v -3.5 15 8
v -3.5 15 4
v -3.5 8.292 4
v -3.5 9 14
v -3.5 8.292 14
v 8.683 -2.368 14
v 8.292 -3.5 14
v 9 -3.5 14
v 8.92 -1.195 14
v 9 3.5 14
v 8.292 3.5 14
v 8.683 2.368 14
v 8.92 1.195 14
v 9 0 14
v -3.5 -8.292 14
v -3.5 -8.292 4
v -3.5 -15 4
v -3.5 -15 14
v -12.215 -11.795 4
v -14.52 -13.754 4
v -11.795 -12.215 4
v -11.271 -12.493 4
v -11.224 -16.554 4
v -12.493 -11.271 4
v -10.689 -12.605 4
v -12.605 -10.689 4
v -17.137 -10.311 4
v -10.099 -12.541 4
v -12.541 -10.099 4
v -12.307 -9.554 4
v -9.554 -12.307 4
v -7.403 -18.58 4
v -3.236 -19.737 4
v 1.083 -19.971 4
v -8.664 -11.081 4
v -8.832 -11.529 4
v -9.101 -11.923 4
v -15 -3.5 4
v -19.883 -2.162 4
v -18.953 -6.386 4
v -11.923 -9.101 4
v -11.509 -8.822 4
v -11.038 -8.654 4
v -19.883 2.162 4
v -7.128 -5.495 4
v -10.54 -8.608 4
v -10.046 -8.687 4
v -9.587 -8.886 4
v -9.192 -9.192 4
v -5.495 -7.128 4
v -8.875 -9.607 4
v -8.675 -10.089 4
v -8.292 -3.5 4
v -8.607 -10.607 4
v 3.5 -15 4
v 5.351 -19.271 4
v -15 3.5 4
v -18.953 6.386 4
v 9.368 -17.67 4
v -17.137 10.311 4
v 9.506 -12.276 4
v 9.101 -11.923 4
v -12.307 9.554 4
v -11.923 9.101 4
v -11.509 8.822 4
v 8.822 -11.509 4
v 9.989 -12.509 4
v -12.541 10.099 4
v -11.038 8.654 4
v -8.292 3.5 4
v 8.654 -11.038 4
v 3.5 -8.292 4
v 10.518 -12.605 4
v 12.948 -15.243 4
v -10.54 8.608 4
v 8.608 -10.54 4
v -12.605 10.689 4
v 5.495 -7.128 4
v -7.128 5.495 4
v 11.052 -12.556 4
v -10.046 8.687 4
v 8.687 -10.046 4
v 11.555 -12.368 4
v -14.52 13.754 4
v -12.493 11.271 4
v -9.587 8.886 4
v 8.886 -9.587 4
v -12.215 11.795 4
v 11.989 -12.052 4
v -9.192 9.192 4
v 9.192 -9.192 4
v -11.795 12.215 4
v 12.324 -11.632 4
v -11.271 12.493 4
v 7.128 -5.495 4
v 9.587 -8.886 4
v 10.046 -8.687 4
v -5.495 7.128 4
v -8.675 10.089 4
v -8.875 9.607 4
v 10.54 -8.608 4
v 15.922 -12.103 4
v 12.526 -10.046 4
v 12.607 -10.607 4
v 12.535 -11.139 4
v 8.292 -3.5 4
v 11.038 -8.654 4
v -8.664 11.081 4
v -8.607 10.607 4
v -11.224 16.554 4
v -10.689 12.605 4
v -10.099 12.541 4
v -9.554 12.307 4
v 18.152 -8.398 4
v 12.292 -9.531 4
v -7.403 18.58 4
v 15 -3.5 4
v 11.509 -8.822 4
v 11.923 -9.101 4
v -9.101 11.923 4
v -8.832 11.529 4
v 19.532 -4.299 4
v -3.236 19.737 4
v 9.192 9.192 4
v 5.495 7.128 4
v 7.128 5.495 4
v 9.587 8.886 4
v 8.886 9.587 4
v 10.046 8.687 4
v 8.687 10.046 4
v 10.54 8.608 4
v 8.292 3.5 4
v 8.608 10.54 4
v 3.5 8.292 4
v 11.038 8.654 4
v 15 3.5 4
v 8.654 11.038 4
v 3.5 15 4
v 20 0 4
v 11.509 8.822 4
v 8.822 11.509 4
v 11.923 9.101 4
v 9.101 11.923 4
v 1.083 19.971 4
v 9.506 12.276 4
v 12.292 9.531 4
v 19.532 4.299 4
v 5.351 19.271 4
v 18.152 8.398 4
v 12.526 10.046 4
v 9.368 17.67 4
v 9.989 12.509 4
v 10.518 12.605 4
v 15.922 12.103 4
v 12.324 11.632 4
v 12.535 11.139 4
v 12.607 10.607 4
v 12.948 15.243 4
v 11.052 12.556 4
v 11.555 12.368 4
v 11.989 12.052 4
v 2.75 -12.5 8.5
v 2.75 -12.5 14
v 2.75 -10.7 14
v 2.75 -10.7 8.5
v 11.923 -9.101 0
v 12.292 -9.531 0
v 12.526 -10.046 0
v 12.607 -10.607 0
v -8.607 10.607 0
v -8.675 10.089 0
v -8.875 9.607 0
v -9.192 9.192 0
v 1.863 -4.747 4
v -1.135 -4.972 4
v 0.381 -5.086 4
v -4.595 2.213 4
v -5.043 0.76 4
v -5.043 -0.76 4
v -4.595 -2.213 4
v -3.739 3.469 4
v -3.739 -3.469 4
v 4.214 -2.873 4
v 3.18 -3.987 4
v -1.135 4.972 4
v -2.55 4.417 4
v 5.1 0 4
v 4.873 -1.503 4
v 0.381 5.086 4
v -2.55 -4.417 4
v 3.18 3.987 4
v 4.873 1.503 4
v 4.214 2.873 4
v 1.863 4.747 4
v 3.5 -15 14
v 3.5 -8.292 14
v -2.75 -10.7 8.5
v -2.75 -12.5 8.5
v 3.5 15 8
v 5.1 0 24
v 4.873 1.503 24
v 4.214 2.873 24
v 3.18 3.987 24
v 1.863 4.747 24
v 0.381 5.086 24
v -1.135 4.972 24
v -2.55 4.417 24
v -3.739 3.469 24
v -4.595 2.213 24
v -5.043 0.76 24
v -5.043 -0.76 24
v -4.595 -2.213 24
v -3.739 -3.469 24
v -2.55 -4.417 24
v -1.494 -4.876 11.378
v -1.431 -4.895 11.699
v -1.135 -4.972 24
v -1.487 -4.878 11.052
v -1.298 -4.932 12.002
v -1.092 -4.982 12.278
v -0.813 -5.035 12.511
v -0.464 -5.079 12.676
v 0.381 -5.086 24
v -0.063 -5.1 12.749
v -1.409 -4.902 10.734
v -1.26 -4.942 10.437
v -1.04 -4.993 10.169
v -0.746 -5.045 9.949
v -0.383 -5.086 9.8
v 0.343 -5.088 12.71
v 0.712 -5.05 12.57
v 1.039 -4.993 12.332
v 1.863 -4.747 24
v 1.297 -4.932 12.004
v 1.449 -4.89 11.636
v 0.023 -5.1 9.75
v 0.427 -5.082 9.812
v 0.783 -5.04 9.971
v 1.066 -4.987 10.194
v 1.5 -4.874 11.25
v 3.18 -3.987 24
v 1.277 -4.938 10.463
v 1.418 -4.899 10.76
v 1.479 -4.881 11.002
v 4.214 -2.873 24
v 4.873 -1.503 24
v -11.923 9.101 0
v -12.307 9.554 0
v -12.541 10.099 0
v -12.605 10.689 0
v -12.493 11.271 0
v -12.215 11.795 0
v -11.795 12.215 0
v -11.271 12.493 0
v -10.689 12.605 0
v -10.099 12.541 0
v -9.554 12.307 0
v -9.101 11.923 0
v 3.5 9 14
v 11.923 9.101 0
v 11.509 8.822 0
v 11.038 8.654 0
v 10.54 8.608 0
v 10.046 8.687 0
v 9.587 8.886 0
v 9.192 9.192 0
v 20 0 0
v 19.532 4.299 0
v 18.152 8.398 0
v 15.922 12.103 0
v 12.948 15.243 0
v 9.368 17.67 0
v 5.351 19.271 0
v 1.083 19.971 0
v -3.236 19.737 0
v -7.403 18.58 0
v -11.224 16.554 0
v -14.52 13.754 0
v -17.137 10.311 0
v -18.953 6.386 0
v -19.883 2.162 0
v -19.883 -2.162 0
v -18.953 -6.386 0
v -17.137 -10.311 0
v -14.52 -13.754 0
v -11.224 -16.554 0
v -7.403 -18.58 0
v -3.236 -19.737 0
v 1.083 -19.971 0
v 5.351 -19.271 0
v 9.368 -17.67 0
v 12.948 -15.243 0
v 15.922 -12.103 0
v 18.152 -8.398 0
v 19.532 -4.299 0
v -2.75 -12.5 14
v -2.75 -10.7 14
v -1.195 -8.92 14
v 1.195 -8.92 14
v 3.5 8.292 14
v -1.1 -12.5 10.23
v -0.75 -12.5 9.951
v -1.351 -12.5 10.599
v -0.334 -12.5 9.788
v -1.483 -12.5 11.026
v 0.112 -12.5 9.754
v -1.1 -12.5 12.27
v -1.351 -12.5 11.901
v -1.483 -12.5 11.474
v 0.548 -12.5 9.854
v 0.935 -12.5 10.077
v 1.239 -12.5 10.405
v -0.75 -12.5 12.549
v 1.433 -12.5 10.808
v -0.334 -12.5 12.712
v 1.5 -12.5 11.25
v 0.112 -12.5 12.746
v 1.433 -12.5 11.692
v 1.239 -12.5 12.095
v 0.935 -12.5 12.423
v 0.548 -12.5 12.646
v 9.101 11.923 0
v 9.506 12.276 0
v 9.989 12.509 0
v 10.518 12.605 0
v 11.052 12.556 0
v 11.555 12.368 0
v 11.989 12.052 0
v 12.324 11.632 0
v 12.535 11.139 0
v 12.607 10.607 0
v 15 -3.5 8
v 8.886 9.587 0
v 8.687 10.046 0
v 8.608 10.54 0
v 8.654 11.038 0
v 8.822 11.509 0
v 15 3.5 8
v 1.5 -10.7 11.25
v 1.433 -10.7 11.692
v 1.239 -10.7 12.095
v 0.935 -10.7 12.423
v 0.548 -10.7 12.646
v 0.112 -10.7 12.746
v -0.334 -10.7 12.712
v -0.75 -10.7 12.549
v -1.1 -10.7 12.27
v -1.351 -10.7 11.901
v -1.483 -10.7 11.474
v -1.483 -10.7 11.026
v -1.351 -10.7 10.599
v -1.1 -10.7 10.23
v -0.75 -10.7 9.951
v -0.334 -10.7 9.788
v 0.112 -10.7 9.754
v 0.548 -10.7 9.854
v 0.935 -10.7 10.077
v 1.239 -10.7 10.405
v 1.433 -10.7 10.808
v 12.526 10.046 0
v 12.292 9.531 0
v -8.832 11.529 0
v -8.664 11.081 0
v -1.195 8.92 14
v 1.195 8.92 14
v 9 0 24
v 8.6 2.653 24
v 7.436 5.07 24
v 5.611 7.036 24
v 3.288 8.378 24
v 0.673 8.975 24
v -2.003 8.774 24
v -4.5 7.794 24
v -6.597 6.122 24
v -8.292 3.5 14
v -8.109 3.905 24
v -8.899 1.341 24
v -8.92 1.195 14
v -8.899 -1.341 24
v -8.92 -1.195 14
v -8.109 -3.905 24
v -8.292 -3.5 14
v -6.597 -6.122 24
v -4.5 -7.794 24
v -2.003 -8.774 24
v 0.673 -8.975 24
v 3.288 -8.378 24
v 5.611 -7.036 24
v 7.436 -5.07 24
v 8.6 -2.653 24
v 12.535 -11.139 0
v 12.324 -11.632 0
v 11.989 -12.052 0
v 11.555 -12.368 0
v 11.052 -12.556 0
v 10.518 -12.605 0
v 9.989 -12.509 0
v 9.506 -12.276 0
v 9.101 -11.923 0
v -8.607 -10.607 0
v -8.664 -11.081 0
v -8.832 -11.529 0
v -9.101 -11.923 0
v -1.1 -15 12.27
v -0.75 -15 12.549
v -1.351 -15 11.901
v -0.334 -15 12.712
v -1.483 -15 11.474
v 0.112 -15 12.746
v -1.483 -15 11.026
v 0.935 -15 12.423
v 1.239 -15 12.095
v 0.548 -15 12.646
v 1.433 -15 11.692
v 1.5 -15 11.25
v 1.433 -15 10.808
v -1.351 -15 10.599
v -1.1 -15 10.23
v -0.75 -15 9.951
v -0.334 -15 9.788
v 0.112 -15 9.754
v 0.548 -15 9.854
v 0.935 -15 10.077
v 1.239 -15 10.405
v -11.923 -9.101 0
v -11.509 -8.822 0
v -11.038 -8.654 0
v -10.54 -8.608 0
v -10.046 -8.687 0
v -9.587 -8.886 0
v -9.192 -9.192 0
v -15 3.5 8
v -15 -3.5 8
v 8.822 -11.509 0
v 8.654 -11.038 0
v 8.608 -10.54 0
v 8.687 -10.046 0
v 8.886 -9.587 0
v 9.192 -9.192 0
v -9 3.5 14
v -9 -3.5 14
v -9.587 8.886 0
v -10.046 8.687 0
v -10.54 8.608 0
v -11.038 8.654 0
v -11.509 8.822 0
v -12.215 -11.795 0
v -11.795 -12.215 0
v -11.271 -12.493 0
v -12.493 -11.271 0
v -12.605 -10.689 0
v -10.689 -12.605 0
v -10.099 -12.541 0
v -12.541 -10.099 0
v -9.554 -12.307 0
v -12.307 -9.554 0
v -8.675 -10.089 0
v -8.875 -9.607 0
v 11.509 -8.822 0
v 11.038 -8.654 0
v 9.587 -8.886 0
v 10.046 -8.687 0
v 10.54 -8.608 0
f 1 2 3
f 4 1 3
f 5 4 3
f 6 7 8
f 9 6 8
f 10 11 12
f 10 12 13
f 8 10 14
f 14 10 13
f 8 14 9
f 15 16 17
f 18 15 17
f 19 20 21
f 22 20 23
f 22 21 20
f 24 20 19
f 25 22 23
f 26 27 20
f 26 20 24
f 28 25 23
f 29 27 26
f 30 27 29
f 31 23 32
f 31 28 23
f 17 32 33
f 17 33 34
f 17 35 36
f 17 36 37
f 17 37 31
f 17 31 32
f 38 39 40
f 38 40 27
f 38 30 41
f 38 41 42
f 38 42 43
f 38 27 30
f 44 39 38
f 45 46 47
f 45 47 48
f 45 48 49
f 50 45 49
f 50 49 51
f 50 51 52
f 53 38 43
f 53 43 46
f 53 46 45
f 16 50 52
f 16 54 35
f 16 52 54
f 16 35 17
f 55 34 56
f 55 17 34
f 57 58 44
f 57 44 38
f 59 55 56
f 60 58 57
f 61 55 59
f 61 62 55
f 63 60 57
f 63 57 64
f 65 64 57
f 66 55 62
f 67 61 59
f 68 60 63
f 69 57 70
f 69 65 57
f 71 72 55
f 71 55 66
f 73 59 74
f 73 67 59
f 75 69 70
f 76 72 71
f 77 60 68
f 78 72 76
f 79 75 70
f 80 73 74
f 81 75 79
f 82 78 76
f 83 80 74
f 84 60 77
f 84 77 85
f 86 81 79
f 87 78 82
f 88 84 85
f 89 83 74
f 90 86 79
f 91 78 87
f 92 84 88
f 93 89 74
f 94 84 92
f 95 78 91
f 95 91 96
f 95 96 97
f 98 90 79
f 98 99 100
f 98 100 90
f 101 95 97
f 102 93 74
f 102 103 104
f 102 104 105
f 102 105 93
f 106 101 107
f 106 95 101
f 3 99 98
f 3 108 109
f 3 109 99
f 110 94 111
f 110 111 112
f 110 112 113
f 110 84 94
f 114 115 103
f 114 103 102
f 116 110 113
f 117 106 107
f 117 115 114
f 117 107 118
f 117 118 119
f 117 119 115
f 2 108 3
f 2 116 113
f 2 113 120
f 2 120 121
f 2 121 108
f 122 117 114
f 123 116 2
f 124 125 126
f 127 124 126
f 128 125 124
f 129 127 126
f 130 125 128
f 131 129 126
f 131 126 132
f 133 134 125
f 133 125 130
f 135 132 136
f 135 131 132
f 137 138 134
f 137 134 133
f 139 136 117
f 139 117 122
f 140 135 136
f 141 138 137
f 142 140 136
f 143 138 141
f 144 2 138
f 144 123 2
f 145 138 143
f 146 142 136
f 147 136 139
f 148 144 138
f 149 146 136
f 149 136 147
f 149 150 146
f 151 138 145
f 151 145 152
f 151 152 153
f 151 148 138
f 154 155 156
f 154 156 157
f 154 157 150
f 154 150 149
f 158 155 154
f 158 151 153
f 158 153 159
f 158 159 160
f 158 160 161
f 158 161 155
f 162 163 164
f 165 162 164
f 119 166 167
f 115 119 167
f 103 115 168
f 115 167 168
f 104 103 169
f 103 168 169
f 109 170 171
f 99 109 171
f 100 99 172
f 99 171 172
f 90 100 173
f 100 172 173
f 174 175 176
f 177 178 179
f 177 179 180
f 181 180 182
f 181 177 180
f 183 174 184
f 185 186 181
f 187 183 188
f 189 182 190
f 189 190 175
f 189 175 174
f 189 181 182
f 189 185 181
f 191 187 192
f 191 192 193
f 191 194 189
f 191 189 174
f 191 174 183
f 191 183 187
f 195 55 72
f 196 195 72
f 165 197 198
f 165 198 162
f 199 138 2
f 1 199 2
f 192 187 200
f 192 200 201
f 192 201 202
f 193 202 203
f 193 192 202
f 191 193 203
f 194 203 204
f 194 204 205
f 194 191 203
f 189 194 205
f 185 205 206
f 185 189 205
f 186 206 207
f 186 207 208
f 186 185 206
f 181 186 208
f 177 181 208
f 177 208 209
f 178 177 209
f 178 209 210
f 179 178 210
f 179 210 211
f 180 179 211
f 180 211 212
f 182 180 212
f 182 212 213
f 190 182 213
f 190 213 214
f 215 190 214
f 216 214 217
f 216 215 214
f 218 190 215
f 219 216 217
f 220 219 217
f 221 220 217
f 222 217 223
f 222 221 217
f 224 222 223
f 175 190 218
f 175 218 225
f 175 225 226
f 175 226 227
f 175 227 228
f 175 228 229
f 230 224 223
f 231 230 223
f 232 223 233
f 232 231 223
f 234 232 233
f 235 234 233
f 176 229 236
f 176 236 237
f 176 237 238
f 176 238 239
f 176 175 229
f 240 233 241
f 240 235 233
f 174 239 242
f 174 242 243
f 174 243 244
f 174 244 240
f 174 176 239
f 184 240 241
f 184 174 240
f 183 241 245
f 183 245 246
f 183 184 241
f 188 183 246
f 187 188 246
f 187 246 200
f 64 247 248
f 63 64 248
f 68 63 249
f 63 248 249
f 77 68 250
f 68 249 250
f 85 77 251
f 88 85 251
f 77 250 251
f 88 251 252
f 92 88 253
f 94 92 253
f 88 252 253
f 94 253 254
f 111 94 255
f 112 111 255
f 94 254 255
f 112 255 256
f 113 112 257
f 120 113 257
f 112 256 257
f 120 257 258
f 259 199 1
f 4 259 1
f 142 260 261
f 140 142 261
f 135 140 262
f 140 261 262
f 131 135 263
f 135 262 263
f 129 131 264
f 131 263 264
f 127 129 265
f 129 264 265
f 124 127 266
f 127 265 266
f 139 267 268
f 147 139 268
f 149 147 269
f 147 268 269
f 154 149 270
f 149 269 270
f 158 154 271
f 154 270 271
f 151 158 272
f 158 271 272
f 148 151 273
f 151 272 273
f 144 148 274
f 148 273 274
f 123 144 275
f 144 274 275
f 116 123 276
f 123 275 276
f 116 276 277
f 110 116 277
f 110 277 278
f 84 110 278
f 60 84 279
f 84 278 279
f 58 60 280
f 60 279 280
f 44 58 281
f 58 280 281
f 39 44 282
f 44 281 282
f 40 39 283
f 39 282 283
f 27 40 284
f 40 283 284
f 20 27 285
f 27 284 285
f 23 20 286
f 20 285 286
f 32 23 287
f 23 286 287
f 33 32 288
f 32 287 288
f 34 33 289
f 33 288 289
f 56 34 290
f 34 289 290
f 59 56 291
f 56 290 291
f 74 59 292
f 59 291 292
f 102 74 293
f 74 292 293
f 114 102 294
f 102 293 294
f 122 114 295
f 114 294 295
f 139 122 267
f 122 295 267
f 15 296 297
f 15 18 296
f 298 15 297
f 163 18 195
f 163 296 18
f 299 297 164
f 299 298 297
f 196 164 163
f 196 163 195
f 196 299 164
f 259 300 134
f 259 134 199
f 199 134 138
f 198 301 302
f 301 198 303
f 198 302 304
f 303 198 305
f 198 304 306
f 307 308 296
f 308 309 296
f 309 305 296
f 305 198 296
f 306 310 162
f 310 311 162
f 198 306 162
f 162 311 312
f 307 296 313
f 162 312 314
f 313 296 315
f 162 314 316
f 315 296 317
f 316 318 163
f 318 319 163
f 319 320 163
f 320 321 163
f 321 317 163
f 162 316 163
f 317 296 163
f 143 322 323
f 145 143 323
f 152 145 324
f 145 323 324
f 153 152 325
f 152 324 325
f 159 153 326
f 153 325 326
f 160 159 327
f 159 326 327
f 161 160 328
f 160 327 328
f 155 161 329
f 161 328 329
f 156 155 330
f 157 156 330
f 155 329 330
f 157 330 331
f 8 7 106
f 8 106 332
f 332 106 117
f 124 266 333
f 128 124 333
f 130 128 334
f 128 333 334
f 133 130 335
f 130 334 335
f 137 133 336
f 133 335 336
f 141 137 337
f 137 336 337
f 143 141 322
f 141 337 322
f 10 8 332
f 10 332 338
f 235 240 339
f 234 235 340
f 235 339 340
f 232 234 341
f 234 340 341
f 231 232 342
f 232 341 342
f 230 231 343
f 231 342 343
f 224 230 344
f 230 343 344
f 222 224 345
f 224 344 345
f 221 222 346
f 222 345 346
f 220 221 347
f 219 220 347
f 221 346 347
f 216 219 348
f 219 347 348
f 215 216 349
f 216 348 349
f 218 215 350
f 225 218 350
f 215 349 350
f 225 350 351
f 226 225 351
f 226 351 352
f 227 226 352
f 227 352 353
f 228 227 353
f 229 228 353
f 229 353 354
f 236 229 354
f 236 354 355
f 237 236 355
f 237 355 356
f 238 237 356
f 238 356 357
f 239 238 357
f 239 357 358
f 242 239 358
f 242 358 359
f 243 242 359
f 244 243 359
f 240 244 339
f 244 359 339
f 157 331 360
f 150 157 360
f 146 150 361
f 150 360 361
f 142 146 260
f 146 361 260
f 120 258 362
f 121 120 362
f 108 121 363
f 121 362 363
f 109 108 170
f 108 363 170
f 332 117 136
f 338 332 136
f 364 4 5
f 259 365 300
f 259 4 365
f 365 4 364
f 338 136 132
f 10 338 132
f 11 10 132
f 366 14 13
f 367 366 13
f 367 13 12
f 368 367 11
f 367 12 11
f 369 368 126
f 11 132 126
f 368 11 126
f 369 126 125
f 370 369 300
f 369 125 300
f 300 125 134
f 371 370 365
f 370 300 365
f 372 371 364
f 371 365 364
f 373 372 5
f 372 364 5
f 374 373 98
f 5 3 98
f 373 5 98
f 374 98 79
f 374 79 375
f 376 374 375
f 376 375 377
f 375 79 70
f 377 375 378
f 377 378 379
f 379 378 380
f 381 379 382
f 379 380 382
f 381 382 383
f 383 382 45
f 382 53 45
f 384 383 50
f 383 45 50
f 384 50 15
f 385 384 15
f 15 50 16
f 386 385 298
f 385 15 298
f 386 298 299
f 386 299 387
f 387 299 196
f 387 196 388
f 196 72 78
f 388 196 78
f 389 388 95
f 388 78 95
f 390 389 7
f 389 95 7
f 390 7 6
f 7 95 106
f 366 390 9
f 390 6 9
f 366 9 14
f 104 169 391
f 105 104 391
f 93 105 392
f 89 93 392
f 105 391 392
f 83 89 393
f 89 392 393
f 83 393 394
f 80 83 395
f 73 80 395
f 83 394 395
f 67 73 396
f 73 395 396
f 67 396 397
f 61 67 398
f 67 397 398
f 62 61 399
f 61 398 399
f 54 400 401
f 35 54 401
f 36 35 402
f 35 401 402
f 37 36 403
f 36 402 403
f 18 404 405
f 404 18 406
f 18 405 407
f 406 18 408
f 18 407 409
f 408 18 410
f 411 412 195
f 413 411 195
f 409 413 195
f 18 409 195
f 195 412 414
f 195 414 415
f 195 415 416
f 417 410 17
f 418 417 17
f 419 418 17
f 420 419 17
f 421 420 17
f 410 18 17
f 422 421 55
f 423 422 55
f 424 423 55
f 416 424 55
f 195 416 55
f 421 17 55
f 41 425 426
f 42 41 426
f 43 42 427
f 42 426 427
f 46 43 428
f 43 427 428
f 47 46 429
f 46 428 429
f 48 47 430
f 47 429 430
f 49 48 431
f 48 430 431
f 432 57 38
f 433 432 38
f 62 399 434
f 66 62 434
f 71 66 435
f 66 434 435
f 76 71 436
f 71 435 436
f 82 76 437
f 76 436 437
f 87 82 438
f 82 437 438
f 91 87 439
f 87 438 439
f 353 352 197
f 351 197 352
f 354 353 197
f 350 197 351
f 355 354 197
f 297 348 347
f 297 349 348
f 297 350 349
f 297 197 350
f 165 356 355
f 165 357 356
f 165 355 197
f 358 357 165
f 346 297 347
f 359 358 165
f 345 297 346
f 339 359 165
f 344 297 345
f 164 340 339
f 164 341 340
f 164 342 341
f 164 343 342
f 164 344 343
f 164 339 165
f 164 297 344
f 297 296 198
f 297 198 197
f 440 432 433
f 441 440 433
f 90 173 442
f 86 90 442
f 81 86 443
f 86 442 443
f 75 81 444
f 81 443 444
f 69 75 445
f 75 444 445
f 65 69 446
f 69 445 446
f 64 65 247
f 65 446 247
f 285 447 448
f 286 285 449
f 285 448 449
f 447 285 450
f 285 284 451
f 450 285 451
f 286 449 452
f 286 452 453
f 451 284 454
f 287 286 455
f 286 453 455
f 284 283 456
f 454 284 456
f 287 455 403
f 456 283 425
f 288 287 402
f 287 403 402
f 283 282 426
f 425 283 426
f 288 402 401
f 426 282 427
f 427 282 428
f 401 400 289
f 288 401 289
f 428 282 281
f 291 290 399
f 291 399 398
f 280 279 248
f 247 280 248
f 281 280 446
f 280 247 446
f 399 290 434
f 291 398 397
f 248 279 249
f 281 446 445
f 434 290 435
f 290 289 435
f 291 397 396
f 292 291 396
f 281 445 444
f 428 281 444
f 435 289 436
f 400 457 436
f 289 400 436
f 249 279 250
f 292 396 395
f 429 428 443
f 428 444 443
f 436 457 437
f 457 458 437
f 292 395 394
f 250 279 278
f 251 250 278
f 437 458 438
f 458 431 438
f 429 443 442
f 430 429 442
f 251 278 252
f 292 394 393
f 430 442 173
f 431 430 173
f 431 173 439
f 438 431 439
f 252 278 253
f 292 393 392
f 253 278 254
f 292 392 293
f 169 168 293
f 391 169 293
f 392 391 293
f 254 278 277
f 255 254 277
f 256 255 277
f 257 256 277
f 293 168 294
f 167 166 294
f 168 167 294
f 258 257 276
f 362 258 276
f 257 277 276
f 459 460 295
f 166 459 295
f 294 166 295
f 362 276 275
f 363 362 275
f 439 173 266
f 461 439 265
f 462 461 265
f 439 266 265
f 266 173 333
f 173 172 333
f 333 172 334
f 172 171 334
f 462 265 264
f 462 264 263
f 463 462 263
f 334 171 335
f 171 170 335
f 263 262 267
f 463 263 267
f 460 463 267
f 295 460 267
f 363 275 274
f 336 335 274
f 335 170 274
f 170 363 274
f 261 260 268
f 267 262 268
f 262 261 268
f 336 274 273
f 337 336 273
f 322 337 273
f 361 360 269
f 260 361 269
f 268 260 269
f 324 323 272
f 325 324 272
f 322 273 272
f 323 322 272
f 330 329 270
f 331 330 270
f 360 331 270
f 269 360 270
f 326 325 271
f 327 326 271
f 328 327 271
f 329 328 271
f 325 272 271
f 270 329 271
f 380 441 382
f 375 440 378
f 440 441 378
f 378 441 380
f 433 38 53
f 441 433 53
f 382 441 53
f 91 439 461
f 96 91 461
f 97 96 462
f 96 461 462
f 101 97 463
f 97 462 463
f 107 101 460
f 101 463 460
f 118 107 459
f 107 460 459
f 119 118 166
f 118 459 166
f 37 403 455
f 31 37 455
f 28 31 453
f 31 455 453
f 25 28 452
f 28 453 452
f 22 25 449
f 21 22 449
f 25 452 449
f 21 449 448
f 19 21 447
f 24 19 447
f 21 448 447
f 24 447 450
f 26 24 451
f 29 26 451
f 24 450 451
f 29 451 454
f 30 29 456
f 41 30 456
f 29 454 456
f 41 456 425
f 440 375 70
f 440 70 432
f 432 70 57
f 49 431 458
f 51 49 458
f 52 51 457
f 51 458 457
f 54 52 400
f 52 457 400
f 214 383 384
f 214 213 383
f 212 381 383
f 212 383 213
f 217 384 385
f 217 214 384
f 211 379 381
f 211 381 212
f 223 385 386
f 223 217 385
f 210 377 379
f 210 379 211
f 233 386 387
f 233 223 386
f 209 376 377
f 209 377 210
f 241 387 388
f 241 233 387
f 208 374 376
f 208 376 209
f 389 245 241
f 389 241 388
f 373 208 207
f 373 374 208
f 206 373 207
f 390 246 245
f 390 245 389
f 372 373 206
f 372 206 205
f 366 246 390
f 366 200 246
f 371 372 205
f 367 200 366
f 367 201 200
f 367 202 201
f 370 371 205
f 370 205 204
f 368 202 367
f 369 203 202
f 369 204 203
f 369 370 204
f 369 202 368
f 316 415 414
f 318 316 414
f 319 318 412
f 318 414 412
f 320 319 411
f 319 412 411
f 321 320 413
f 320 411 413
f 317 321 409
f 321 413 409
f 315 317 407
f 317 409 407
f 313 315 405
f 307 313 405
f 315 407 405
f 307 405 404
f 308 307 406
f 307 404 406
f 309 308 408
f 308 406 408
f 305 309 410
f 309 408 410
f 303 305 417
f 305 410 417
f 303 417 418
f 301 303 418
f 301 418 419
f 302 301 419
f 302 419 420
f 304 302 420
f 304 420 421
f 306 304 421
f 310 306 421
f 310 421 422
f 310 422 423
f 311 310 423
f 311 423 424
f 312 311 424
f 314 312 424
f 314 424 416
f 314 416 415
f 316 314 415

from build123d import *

# Parameters (mm, degrees)
F0_R      = 20
F1_DEPTH  = 4
F2_R      = 9
F2_R_2    = 5.1
F3_DEPTH  = 20
F5_DEPTH  = 10
F6_W      = 5.5
F6_H      = 1.8
F7_DEPTH  = 5.5
F8_R      = 1.5
F9_DEPTH  = 11
F10_SIZE  = 5.99999
F12_DEPTH = 25


# Not quite as in the source:
# - a fillet or chamfer is up to 0.001 mm smaller than in the source, because OpenCascade refuses the exact size


with BuildPart() as f1:
    # F0 (on Top) → F1 (new body)
    with BuildSketch(Plane.XY):
        Circle(F0_R)
    extrude(amount=F1_DEPTH)

    # F2 (on face) → F3 (join)
    with BuildSketch(Plane.XY.offset(4)):
        Circle(F2_R)
        Circle(F2_R_2, mode=Mode.SUBTRACT)
    extrude(amount=F3_DEPTH)

    # F4 (on face) → F5 (join)
    with BuildSketch(Plane.XY.offset(4)):
        with BuildLine():
            Line((-3.5, 15), (-3.5, 8.2915619759))
            ThreePointArc((-3.5, 8.2915619759), (0, 9), (3.5, 8.2915619759))
            Line((3.5, 8.2915619759), (3.5, 15))
            Line((3.5, 15), (-3.5, 15))
        make_face()
        with BuildLine():
            Line((15, 3.5), (8.2915619759, 3.5))
            ThreePointArc((8.2915619759, 3.5), (8.8211126788, 1.785489039), (9, 0))
            ThreePointArc((9, 0), (8.8211126788, -1.785489039), (8.2915619759, -3.5))
            Line((8.2915619759, -3.5), (15, -3.5))
            Line((15, -3.5), (15, 3.5))
        make_face()
        with BuildLine():
            Line((-8.2915619759, 3.5), (-15, 3.5))
            Line((-15, 3.5), (-15, -3.5))
            Line((-15, -3.5), (-8.2915619759, -3.5))
            ThreePointArc((-8.2915619759, -3.5), (-9, 0), (-8.2915619759, 3.5))
        make_face()
        with BuildLine():
            ThreePointArc((3.5, -8.2915619759), (0, -9), (-3.5, -8.2915619759))
            Line((-3.5, -8.2915619759), (-3.5, -15))
            Line((-3.5, -15), (3.5, -15))
            Line((3.5, -15), (3.5, -8.2915619759))
        make_face()
    extrude(amount=F5_DEPTH)

    # F6 (on face) → F7 (cut)
    with BuildSketch(Plane.XY.offset(14)):
        with Locations((0, -11.6)):
            Rectangle(F6_W, F6_H)
    extrude(amount=-F7_DEPTH, mode=Mode.SUBTRACT)

    # F8 (on face) → F9 (cut)
    with BuildSketch(Plane.XZ.offset(15)):
        with Locations((0, 11.25)):
            Circle(F8_R)
    extrude(amount=-F9_DEPTH, mode=Mode.SUBTRACT)

    # F10 (size 6 in the source; OpenCascade refuses exactly that, so slightly less here)
    f10_edges = [f1.edges().sort_by_distance(p)[0] for p in [
        (15, 0, 14),
        (0, 15, 14),
        (-15, 0, 14),
    ]]
    chamfer(f10_edges, length=F10_SIZE)

    # F11 (on face) → F12 (cut)
    with BuildSketch(Plane(origin=(0, 0, 0), x_dir=(1, 0, 0), z_dir=(0, 0, -1))):
        with BuildLine():
            ThreePointArc((-10.6066017178, 10.6066017178), (-9.8758984631, 11.2901120254), (-9.1012534477, 11.9233881795))
            ThreePointArc((-9.1012534477, 11.9233881795), (-12.0208152802, 12.0208152802), (-11.9233881795, 9.1012534477))
            ThreePointArc((-11.9233881795, 9.1012534477), (-11.2901120254, 9.8758984631), (-10.6066017178, 10.6066017178))
        make_face()
        with BuildLine():
            Line((-10.6066017178, 10.6066017178), (-9.1923881554, 9.1923881554))
            ThreePointArc((-9.1923881554, 9.1923881554), (-8.7588426528, 9.8412348531), (-8.6066017178, 10.6066017178))
            ThreePointArc((-8.6066017178, 10.6066017178), (-8.7343441847, 11.3099165335), (-9.1012534477, 11.9233881795))
            ThreePointArc((-9.1012534477, 11.9233881795), (-9.8758984631, 11.2901120254), (-10.6066017178, 10.6066017178))
        make_face()
        with BuildLine():
            ThreePointArc((-11.9233881795, 9.1012534477), (-10.5398979419, 8.6077143757), (-9.1923881554, 9.1923881554))
            Line((-9.1923881554, 9.1923881554), (-10.6066017178, 10.6066017178))
            ThreePointArc((-10.6066017178, 10.6066017178), (-11.2901120254, 9.8758984631), (-11.9233881795, 9.1012534477))
        make_face()
        with BuildLine():
            ThreePointArc((9.1923881554, 9.1923881554), (10.5398979419, 8.6077143757), (11.9233881795, 9.1012534477))
            ThreePointArc((11.9233881795, 9.1012534477), (11.2901120254, 9.8758984631), (10.6066017178, 10.6066017178))
            Line((10.6066017178, 10.6066017178), (9.1923881554, 9.1923881554))
        make_face()
        with BuildLine():
            ThreePointArc((10.6066017178, 10.6066017178), (11.2901120254, 9.8758984631), (11.9233881795, 9.1012534477))
            ThreePointArc((11.9233881795, 9.1012534477), (12.427806391, 9.7800343955), (12.6066017178, 10.6066017178))
            ThreePointArc((12.6066017178, 10.6066017178), (11.3099165335, 12.4788592508), (9.1012534477, 11.9233881795))
            ThreePointArc((9.1012534477, 11.9233881795), (9.8758984631, 11.2901120254), (10.6066017178, 10.6066017178))
        make_face()
        with BuildLine():
            Line((9.1923881554, 9.1923881554), (10.6066017178, 10.6066017178))
            ThreePointArc((10.6066017178, 10.6066017178), (9.8758984631, 11.2901120254), (9.1012534477, 11.9233881795))
            ThreePointArc((9.1012534477, 11.9233881795), (8.6077143757, 10.5398979419), (9.1923881554, 9.1923881554))
        make_face()
        with BuildLine():
            ThreePointArc((12.6066017178, -10.6066017178), (12.427806391, -9.7800343955), (11.9233881795, -9.1012534477))
            ThreePointArc((11.9233881795, -9.1012534477), (11.2901120254, -9.8758984631), (10.6066017178, -10.6066017178))
            ThreePointArc((10.6066017178, -10.6066017178), (9.8758984631, -11.2901120254), (9.1012534477, -11.9233881795))
            ThreePointArc((9.1012534477, -11.9233881795), (11.3099165335, -12.4788592508), (12.6066017178, -10.6066017178))
        make_face()
        with BuildLine():
            ThreePointArc((10.6066017178, -10.6066017178), (11.2901120254, -9.8758984631), (11.9233881795, -9.1012534477))
            ThreePointArc((11.9233881795, -9.1012534477), (10.5398979419, -8.6077143757), (9.1923881554, -9.1923881554))
            Line((9.1923881554, -9.1923881554), (10.6066017178, -10.6066017178))
        make_face()
        with BuildLine():
            ThreePointArc((9.1012534477, -11.9233881795), (9.8758984631, -11.2901120254), (10.6066017178, -10.6066017178))
            Line((10.6066017178, -10.6066017178), (9.1923881554, -9.1923881554))
            ThreePointArc((9.1923881554, -9.1923881554), (8.6077143757, -10.5398979419), (9.1012534477, -11.9233881795))
        make_face()
        with BuildLine():
            ThreePointArc((-11.9233881795, -9.1012534477), (-12.0208152802, -12.0208152802), (-9.1012534477, -11.9233881795))
            ThreePointArc((-9.1012534477, -11.9233881795), (-9.8758984631, -11.2901120254), (-10.6066017178, -10.6066017178))
            ThreePointArc((-10.6066017178, -10.6066017178), (-11.2901120254, -9.8758984631), (-11.9233881795, -9.1012534477))
        make_face()
        with BuildLine():
            ThreePointArc((-8.6066017178, -10.6066017178), (-8.7588426528, -9.8412348531), (-9.1923881554, -9.1923881554))
            Line((-9.1923881554, -9.1923881554), (-10.6066017178, -10.6066017178))
            ThreePointArc((-10.6066017178, -10.6066017178), (-9.8758984631, -11.2901120254), (-9.1012534477, -11.9233881795))
            ThreePointArc((-9.1012534477, -11.9233881795), (-8.7343441847, -11.3099165335), (-8.6066017178, -10.6066017178))
        make_face()
        with BuildLine():
            Line((-10.6066017178, -10.6066017178), (-9.1923881554, -9.1923881554))
            ThreePointArc((-9.1923881554, -9.1923881554), (-10.5398979419, -8.6077143757), (-11.9233881795, -9.1012534477))
            ThreePointArc((-11.9233881795, -9.1012534477), (-11.2901120254, -9.8758984631), (-10.6066017178, -10.6066017178))
        make_face()
    extrude(amount=-F12_DEPTH, mode=Mode.SUBTRACT)


solid = f1.part
